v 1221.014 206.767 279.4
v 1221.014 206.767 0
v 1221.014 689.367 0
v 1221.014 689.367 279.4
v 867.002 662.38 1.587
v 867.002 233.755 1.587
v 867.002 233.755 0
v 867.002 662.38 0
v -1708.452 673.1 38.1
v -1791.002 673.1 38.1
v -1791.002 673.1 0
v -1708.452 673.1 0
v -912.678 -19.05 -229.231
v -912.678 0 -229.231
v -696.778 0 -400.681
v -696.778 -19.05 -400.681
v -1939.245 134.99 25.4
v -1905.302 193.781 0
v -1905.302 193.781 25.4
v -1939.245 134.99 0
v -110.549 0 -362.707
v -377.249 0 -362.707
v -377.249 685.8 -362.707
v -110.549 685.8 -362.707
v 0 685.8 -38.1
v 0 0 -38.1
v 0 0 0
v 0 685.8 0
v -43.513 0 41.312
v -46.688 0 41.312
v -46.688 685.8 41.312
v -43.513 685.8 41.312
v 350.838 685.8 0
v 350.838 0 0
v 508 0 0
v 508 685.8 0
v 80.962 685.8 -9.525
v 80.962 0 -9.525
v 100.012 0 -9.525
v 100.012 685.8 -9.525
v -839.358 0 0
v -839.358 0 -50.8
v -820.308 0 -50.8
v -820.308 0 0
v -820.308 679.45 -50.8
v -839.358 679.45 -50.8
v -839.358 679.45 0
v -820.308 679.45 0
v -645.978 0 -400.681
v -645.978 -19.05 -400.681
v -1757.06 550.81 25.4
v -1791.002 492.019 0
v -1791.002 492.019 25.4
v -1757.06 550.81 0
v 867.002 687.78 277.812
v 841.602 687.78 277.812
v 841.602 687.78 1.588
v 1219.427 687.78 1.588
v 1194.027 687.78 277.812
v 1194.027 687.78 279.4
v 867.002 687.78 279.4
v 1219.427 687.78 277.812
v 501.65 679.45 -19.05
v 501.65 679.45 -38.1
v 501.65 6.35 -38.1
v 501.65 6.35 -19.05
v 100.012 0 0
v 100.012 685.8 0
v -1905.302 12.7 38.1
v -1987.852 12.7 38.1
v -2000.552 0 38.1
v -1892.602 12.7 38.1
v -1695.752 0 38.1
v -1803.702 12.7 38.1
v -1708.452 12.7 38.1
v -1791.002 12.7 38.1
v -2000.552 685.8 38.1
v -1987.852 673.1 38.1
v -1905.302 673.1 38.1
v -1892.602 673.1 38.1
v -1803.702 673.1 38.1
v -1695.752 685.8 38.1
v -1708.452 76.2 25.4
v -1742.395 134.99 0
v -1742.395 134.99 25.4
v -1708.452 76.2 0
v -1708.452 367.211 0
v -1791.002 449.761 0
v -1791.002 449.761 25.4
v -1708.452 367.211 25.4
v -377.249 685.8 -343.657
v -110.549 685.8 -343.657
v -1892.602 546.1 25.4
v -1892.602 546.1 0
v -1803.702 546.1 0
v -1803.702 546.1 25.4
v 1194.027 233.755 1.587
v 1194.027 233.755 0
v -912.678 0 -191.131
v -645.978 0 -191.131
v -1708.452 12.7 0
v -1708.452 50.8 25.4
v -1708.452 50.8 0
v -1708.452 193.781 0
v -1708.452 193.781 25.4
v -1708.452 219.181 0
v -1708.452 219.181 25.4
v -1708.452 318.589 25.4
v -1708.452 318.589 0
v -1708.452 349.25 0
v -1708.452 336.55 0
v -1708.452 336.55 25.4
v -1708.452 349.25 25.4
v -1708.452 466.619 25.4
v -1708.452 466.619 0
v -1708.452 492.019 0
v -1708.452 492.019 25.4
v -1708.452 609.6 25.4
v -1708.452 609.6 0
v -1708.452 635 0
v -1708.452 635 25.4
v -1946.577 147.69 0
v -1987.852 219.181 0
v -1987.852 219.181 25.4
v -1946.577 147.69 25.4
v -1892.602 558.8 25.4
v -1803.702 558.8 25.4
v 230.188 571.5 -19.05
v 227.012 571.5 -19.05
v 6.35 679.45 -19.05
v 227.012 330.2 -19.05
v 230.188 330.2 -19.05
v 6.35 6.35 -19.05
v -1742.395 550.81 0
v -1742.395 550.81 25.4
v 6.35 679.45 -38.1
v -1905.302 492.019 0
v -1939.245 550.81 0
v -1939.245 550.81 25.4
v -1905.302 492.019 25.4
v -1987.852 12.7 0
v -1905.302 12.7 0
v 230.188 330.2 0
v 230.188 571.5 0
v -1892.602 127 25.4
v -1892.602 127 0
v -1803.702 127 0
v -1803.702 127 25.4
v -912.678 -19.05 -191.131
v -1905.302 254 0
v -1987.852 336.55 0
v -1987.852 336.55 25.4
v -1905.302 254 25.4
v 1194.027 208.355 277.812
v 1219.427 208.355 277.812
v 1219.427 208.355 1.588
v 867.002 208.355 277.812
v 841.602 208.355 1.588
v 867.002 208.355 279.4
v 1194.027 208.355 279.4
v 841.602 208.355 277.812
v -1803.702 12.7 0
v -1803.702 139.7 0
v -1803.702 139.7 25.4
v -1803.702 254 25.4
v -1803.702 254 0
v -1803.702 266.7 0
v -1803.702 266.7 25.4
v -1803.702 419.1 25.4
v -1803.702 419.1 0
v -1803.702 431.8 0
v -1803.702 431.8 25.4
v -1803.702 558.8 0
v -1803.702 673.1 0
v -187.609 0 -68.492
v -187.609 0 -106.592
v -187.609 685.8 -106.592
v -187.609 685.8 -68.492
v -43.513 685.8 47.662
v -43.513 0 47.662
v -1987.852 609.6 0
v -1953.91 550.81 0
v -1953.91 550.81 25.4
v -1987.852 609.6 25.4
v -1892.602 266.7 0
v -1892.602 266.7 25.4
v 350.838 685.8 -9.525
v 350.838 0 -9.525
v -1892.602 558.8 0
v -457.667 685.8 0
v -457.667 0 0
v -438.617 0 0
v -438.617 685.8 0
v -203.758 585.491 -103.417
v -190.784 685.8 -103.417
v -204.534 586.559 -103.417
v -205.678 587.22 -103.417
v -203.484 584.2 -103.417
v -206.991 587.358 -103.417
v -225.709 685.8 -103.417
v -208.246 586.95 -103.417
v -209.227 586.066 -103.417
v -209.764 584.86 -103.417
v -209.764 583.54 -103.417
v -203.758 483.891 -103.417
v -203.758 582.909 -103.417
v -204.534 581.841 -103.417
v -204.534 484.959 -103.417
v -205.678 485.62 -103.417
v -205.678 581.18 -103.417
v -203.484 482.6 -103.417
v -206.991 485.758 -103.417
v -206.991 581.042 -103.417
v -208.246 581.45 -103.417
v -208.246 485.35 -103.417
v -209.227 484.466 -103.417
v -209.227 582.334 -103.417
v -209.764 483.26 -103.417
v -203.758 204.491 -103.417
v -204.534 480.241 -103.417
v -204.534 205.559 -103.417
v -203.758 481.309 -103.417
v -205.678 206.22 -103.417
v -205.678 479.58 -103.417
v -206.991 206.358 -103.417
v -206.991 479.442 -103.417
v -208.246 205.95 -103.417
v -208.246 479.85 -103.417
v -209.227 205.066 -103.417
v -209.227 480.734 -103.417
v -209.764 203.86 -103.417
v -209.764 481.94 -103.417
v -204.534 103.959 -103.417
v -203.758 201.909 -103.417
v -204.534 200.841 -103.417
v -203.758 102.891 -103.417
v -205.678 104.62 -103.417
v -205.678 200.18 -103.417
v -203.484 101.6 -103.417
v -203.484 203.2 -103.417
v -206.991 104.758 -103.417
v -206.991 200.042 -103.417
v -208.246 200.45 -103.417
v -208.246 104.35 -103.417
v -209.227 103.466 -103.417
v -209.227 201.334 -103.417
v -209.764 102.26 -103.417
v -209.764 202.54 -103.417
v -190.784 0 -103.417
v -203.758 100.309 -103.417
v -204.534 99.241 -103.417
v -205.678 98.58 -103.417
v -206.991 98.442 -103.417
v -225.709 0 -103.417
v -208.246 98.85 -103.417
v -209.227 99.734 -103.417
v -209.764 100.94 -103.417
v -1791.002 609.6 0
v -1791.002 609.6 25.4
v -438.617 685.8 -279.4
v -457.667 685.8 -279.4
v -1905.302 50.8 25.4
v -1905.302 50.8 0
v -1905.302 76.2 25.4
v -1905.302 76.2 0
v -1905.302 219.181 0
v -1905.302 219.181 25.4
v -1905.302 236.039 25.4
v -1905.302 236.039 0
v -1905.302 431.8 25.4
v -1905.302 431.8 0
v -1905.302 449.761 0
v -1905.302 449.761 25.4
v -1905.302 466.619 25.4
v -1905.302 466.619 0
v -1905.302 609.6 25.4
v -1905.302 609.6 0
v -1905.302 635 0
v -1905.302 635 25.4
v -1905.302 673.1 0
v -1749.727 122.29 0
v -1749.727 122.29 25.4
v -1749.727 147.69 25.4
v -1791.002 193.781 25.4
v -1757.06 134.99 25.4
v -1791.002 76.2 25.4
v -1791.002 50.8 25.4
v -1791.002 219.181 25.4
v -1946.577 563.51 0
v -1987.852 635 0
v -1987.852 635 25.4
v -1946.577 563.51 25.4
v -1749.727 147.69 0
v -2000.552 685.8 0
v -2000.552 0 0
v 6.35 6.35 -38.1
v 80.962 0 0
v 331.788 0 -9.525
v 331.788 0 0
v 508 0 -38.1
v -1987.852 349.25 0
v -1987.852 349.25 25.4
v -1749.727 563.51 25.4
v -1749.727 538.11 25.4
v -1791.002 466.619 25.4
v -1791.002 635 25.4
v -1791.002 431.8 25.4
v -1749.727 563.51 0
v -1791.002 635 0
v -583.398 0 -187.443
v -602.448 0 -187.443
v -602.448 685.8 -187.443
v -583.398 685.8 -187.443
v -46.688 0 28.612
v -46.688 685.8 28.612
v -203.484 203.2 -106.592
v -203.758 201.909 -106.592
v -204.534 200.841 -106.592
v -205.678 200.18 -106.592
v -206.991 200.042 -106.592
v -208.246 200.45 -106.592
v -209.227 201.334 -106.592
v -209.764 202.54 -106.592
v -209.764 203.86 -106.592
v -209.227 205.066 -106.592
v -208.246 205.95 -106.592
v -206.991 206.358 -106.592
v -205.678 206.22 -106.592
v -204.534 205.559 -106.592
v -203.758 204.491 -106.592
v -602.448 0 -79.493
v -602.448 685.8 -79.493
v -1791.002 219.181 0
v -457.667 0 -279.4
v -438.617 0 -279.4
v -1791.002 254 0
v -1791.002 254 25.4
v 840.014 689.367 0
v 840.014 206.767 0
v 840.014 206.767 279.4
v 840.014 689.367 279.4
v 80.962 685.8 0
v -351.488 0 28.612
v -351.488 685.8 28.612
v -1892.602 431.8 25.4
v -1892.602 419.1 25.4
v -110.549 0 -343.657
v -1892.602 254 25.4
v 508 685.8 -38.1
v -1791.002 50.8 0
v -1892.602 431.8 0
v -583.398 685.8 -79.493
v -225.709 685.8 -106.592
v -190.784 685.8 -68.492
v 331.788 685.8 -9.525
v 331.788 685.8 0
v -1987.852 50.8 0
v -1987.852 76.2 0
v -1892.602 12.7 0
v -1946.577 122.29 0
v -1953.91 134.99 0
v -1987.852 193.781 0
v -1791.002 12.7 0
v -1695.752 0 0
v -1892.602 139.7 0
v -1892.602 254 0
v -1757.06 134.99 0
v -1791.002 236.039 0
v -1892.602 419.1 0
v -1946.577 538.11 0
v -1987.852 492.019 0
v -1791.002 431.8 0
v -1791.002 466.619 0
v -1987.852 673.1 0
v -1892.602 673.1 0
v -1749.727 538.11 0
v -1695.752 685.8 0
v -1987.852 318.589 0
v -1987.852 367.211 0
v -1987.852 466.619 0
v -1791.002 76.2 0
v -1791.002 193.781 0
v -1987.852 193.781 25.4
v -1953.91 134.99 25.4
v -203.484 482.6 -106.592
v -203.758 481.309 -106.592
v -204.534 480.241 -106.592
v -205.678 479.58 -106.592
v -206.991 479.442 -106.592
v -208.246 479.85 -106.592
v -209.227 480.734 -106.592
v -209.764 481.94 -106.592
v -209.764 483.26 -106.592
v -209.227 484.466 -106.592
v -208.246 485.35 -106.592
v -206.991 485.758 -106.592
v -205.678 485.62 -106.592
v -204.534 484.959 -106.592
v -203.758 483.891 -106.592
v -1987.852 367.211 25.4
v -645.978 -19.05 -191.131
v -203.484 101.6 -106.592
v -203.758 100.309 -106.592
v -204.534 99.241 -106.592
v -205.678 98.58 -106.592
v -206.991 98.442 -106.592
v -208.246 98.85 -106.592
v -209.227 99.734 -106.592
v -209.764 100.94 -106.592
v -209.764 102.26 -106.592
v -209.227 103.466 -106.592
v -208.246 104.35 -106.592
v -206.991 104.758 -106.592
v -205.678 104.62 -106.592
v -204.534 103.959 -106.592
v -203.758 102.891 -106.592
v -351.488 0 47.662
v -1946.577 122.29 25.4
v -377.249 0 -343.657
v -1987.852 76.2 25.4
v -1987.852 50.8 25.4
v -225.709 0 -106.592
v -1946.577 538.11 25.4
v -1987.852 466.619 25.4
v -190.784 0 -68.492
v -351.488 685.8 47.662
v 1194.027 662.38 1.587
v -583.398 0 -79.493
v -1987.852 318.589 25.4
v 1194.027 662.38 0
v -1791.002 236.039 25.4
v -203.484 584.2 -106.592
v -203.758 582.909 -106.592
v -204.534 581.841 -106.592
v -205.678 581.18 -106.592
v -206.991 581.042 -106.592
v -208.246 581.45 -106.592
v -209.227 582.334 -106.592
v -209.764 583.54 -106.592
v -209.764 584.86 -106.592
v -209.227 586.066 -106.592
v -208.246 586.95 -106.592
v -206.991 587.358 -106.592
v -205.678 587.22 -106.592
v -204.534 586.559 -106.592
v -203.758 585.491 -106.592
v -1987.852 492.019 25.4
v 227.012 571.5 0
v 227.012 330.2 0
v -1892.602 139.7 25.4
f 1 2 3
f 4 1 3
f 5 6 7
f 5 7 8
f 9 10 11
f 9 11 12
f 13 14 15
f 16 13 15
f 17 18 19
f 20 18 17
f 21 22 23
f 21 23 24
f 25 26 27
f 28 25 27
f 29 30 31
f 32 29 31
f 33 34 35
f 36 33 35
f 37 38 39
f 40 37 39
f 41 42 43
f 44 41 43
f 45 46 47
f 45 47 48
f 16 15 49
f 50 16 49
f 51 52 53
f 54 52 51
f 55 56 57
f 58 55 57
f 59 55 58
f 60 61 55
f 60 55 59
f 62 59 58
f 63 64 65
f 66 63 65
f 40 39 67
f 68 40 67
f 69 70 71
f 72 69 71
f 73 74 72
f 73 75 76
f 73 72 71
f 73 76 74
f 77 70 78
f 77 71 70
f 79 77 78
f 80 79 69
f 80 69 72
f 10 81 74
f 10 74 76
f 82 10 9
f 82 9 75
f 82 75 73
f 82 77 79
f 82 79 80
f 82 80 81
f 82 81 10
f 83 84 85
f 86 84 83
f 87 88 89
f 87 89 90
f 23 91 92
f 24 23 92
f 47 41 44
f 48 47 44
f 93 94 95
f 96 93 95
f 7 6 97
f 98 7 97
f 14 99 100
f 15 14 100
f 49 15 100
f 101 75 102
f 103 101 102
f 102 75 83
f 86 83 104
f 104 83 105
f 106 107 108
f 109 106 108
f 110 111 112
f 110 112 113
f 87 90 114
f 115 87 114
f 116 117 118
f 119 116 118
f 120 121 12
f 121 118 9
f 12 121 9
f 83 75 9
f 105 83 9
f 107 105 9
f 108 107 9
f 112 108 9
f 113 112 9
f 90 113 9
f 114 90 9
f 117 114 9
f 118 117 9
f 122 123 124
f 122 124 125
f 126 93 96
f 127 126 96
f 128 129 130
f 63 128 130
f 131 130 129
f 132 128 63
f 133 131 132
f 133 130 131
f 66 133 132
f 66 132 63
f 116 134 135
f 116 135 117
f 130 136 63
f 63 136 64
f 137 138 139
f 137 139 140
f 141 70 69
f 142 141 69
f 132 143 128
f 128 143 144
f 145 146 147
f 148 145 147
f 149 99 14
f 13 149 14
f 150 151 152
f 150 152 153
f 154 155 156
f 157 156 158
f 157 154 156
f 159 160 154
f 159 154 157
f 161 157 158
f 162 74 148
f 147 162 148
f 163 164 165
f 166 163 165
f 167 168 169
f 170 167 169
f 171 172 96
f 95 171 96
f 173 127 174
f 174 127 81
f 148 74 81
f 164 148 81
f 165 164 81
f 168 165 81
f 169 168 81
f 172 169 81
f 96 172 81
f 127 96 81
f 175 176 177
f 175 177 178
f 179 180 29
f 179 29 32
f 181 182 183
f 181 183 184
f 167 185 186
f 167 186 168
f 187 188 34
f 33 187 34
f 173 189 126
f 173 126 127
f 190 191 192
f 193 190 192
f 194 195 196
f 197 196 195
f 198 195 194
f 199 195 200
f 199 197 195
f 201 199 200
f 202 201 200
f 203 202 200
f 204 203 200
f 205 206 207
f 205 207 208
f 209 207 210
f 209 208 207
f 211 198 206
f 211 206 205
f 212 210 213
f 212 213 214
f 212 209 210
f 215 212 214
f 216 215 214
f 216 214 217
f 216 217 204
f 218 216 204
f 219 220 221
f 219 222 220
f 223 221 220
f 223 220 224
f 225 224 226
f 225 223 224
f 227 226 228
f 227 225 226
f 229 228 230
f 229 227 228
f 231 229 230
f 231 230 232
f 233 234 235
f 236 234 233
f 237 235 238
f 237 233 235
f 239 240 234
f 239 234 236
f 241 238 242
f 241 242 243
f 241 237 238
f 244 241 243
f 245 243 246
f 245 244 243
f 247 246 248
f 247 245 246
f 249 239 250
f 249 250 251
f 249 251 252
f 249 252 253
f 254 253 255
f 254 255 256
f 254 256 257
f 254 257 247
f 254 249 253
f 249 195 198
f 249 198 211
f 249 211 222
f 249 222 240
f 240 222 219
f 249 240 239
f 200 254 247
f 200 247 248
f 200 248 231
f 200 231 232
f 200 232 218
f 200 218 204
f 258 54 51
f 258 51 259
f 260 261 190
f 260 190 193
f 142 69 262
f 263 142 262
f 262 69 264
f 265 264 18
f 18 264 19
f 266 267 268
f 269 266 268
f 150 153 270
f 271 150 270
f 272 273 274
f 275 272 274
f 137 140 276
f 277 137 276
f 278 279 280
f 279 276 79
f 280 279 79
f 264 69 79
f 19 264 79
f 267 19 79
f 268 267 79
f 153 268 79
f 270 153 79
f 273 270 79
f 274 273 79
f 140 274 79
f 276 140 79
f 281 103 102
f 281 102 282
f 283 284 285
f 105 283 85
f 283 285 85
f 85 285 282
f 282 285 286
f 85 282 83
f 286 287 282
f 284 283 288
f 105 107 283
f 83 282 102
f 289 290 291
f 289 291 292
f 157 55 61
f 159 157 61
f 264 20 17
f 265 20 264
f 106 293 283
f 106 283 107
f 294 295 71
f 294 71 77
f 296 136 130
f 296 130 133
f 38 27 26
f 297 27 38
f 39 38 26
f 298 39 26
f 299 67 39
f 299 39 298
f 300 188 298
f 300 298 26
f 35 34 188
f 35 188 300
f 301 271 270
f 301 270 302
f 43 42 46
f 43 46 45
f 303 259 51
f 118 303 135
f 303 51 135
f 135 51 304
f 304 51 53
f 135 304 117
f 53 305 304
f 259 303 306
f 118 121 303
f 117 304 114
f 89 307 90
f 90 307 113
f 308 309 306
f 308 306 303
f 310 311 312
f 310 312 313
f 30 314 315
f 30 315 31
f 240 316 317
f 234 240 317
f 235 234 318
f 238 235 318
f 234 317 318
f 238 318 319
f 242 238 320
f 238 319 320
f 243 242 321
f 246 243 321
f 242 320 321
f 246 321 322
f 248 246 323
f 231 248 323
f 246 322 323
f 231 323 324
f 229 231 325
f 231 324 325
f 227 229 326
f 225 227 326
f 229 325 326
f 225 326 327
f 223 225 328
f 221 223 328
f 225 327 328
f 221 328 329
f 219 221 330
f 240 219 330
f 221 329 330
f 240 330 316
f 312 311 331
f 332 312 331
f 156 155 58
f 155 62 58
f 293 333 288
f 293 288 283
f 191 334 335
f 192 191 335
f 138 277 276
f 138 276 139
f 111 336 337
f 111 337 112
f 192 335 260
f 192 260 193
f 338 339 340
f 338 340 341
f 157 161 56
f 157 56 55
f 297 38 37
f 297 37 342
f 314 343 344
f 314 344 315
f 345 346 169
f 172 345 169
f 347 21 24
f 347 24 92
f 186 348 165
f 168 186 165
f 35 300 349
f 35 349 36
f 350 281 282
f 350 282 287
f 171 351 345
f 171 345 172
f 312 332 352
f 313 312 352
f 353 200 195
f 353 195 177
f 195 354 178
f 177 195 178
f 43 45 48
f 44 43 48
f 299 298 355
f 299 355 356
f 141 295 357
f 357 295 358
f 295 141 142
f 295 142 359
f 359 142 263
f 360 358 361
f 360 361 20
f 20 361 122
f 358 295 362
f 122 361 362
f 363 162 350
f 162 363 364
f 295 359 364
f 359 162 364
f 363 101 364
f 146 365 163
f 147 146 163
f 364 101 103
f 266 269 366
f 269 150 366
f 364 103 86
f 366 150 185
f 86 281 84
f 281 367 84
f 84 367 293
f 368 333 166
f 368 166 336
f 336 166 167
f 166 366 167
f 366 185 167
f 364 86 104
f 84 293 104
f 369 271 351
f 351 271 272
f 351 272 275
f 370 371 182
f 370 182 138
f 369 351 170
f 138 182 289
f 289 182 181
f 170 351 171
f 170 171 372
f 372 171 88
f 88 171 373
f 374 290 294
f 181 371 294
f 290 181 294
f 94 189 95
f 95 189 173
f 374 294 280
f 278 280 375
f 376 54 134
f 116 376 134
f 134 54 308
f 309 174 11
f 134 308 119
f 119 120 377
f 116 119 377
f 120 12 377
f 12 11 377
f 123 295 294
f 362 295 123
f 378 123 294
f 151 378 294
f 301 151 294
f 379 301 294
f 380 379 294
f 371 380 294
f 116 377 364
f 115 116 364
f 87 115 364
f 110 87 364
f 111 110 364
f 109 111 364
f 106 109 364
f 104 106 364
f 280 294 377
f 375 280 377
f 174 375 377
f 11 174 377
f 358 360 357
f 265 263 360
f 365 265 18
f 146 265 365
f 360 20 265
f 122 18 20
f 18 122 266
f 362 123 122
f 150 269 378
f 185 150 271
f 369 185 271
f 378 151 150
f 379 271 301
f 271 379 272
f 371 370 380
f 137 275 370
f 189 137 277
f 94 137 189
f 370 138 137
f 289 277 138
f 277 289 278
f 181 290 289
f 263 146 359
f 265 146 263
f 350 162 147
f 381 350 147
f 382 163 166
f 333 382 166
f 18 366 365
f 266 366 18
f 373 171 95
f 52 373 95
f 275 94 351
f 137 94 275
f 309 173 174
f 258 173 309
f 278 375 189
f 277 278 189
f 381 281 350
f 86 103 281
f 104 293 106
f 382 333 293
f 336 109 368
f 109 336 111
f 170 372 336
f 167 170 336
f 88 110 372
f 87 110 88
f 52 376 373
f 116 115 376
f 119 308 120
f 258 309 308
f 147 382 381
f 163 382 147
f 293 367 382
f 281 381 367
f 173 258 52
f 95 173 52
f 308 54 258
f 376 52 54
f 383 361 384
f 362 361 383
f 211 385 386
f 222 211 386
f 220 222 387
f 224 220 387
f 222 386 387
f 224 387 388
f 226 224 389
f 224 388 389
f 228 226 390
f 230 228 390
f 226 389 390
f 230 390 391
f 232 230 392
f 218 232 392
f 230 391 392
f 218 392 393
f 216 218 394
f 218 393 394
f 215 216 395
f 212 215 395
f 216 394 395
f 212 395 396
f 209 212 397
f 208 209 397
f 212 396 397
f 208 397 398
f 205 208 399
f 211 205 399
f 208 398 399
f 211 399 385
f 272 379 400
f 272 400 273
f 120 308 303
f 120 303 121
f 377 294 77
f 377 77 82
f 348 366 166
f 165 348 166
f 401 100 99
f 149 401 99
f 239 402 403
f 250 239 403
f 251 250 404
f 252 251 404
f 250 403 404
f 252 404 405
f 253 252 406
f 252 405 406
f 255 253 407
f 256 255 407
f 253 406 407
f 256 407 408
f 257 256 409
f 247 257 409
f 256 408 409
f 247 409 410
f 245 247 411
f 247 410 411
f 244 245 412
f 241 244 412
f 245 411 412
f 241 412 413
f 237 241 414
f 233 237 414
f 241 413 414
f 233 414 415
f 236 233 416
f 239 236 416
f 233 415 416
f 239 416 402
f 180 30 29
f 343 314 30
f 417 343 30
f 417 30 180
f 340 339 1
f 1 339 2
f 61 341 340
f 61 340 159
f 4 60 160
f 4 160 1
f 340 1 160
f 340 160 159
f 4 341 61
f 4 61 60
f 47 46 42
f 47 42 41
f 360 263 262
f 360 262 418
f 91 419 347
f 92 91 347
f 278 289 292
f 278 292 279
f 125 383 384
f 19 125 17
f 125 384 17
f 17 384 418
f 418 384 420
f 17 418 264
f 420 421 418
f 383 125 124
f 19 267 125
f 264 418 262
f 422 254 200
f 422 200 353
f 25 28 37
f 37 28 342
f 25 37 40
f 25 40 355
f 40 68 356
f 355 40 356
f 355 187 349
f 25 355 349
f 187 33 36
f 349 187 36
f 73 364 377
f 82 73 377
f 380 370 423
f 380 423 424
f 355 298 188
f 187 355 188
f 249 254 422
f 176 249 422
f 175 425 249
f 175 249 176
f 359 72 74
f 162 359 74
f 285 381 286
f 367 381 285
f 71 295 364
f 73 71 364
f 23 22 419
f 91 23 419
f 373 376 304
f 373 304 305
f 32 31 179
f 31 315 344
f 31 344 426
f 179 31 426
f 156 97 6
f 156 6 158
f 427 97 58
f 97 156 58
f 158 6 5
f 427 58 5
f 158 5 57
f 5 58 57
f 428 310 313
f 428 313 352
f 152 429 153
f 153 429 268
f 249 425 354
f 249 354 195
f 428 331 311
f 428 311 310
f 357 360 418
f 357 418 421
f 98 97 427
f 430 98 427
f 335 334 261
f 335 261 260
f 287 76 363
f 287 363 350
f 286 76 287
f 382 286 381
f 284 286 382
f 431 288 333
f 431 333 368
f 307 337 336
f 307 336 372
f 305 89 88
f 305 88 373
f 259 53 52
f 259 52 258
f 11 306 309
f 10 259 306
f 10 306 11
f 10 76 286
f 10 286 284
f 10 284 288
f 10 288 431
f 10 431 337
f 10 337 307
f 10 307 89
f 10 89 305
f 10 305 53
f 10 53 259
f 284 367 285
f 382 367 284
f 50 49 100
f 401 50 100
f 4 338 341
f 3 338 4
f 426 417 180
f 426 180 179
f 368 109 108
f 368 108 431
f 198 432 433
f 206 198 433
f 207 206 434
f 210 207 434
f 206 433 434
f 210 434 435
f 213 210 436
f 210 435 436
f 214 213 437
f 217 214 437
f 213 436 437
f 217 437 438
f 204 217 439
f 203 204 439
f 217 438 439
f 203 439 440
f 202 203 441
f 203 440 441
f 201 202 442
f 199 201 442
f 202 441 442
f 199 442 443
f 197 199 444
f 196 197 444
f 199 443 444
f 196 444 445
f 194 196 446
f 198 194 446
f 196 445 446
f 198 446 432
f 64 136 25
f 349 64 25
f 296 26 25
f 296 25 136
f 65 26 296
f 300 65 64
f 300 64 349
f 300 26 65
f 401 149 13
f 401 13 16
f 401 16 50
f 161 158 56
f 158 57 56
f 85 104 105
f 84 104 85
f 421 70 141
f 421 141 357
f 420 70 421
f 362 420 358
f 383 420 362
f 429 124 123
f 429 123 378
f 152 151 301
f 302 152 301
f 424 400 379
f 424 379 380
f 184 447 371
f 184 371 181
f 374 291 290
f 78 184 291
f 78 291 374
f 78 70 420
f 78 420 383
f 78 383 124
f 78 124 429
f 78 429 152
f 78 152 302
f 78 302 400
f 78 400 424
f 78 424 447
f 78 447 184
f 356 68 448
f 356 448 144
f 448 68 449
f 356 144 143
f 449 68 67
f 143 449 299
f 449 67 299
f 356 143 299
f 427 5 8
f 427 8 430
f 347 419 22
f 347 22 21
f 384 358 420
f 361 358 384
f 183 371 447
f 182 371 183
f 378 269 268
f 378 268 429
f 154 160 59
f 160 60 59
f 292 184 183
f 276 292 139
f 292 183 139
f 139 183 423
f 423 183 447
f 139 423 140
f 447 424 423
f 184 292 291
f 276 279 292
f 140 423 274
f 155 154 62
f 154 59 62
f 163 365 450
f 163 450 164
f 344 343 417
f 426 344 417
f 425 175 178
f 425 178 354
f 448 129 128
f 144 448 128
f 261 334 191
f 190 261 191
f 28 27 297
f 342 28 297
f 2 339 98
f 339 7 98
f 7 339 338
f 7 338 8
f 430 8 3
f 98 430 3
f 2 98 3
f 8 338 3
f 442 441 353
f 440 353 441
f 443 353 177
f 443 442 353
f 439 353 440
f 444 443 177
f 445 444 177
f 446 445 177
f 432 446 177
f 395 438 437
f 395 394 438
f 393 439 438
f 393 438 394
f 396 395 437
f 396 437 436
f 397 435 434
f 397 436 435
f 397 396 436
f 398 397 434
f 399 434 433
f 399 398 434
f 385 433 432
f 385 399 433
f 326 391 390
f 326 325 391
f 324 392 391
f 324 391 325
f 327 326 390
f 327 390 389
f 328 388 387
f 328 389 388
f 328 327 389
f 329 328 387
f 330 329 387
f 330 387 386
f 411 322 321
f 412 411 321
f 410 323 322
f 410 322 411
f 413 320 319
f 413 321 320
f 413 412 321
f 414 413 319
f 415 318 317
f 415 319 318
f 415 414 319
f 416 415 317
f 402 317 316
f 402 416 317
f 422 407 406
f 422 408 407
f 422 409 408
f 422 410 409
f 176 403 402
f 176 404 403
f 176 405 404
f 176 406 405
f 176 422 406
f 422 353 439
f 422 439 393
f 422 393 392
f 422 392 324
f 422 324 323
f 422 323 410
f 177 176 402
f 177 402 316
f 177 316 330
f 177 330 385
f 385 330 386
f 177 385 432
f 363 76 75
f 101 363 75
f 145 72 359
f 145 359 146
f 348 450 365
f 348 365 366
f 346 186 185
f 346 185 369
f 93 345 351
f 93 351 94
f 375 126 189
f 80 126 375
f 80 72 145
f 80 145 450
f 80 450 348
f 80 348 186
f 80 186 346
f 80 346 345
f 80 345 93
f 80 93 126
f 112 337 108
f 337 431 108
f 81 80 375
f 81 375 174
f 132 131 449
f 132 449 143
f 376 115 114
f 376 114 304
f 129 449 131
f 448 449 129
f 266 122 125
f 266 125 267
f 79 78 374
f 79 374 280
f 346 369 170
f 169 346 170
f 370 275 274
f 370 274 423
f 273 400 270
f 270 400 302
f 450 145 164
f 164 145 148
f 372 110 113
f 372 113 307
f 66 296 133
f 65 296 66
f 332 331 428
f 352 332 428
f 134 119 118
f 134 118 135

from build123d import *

# Parameters (mm, degrees)
F0_W      = 508
F0_H      = 38.1
F1_DEPTH  = 685.8
F3_DEPTH  = 685.8
F4_W      = 304.8
F4_H      = 19.05
F5_DEPTH  = 685.8
F6_W      = 19.05
F6_H      = 279.4
F7_DEPTH  = 685.8
F8_W      = 495.3
F8_H      = 673.1
F9_DEPTH  = 19.05
F10_W     = 685.8
F10_H     = 6.35
F11_DEPTH = 3.175
F12_R     = 3.175
F13_DEPTH = 154.2556030521
F14_W     = 266.7
F14_H     = 19.05
F15_DEPTH = 685.8
F16_W     = 19.05
F16_H     = 50.8
F17_DEPTH = 679.45
F18_W     = 19.05
F18_H     = 107.95
F19_DEPTH = 685.8
F21_DEPTH = 19.05
F22_W     = 19.05
F22_H     = 9.525
F23_DEPTH = 685.801
F24_W     = 3.175
F24_H     = 241.3
F25_DEPTH = 400.6821936617
F26_W     = 381
F26_H     = 482.6
F27_DEPTH = 279.4
F28_W     = 327.025
F28_H     = 428.625
F29_DEPTH = 680.0821936617
F30_W     = 428.625
F30_H     = 276.225
F31_DEPTH = 25.4
F32_W     = 428.625
F32_H     = 276.225
F33_DEPTH = 25.4
F35_DEPTH = 25.4
F37_DEPTH = 25.4
F38_W     = 304.8
F38_H     = 685.8
F39_DEPTH = 38.1
F40_W     = 82.55
F40_H     = 660.4
F40_W_2   = 88.9
F41_DEPTH = 438.7821936617
F42_W     = 88.9
F42_H     = 660.4
F42_W_2   = 82.55
F43_DEPTH = 6.35
F44_W     = 88.9
F44_H     = 12.7
F45_DEPTH = 25.4


with BuildPart() as f1:
    # F0 (on Front) → F1 (new body)
    with BuildSketch(Plane.XZ):
        with Locations((254, -19.05)):
            Rectangle(F0_W, F0_H)
    extrude(amount=-F1_DEPTH)

    # F8 (on face) → F9 (cut)
    with BuildSketch(Plane(origin=(0, 0, -38.1), x_dir=(1, 0, 0), z_dir=(0, 0, -1))):
        with Locations((254, -342.9)):
            Rectangle(F8_W, F8_H)
    extrude(amount=-F9_DEPTH, mode=Mode.SUBTRACT)

    # F22 (on face) → F23 (cut, through all)
    with BuildSketch(Plane.XZ):
        with Locations((90.4875, -4.7625)):
            Rectangle(F22_W, F22_H)
        with Locations((341.3125, -4.7625)):
            Rectangle(F22_W, F22_H)
    extrude(amount=-F23_DEPTH, mode=Mode.SUBTRACT)

    # F24 (on face) → F25 (cut, through all)
    with BuildSketch(Plane.XY):
        with Locations((228.6, 450.85)):
            Rectangle(F24_W, F24_H)
    extrude(amount=-F25_DEPTH, mode=Mode.SUBTRACT)

    # F42 (on face) → F43 (cut)
    with BuildSketch(Plane.XY.offset(38.1)):
        with Locations((-1848.1522202492, 342.9)):
            Rectangle(F42_W, F42_H)
        with Locations((-1749.7272202492, 342.9)):
            Rectangle(F42_W_2, F42_H)
    extrude(amount=-F43_DEPTH, mode=Mode.SUBTRACT)


with BuildPart() as f3:
    # F2 (on Front) → F3 (new body, through all)
    with BuildSketch(Plane.XZ):
        Polygon((-187.6088068062, -106.5923403651), (-187.6088068062, -68.4923403651), (-190.7838068062, -68.4923403651), (-190.7838068062, -103.4173403651), (-225.7088068062, -103.4173403651), (-225.7088068062, -106.5923403651), align=None)
    extrude(amount=-F3_DEPTH)

    # F12 (on face) → F13 (cut, through all)
    with BuildSketch(Plane(origin=(0, 0, -106.5923403651), x_dir=(1, 0, 0), z_dir=(0, 0, -1))):
        with Locations((-206.6588068062, -101.6)):
            Circle(F12_R)
        with Locations((-206.6588068062, -203.2)):
            Circle(F12_R)
        with Locations((-206.6588068062, -482.6)):
            Circle(F12_R)
        with Locations((-206.6588068062, -584.2)):
            Circle(F12_R)
    extrude(amount=-F13_DEPTH, mode=Mode.SUBTRACT)


with BuildPart() as f5:
    # F4 (on Front) → F5 (new body, through all)
    with BuildSketch(Plane.XZ):
        with Locations((-199.0881011365, 38.1372626871)):
            Rectangle(F4_W, F4_H)
    extrude(amount=-F5_DEPTH)

    # F10 (on face) → F11 (join)
    with BuildSketch(Plane.YZ.offset(-46.6881011365)):
        with Locations((342.9, 44.4872626871)):
            Rectangle(F10_W, F10_H)
    extrude(amount=F11_DEPTH)


with BuildPart() as f7:
    # F6 (on Front) → F7 (new body, through all)
    with BuildSketch(Plane.XZ):
        with Locations((-448.1418677211, -139.7)):
            Rectangle(F6_W, F6_H)
    extrude(amount=-F7_DEPTH)


with BuildPart() as f15:
    # F14 (on Front) → F15 (new body, through all)
    with BuildSketch(Plane.XZ):
        with Locations((-243.8991005421, -353.181636688)):
            Rectangle(F14_W, F14_H)
    extrude(amount=-F15_DEPTH)


with BuildPart() as f17:
    # F16 (on Front) → F17 (new body, through all)
    with BuildSketch(Plane.XZ):
        with Locations((-829.8331966219, -25.4)):
            Rectangle(F16_W, F16_H)
    extrude(amount=-F17_DEPTH)


with BuildPart() as f19:
    # F18 (on Front) → F19 (new body, through all)
    with BuildSketch(Plane.XZ):
        with Locations((-592.9225683212, -133.4683134563)):
            Rectangle(F18_W, F18_H)
    extrude(amount=-F19_DEPTH)


with BuildPart() as f21:
    # F20 (on Front) → F21 (new body)
    with BuildSketch(Plane.XZ):
        Polygon((-645.9781700617, -191.1311936617), (-912.6781700617, -191.1311936617), (-912.6781700617, -229.2311936617), (-696.7781700617, -400.6811936617), (-645.9781700617, -400.6811936617), align=None)
    extrude(amount=F21_DEPTH)


with BuildPart() as f27:
    # F26 (on Top) → F27 (new body)
    with BuildSketch(Plane.XY):
        with Locations((1030.5143296719, 448.0673644527)):
            Rectangle(F26_W, F26_H)
    extrude(amount=F27_DEPTH)

    # F28 (on face) → F29 (cut, through all)
    with BuildSketch(Plane.XY.offset(279.4)):
        with Locations((1030.5143296719, 448.0673644527)):
            Rectangle(F28_W, F28_H)
    extrude(amount=-F29_DEPTH, mode=Mode.SUBTRACT)

    # F30 (on face) → F31 (cut)
    with BuildSketch(Plane.YZ.offset(867.0018296719)):
        with Locations((448.0673644527, 139.7)):
            Rectangle(F30_W, F30_H)
    extrude(amount=-F31_DEPTH, mode=Mode.SUBTRACT)

    # F32 (on face) → F33 (cut)
    with BuildSketch(Plane(origin=(1194.0268296719, 0, 0), x_dir=(0, -1, 0), z_dir=(-1, 0, 0))):
        with Locations((-448.0673644527, 139.7)):
            Rectangle(F32_W, F32_H)
    extrude(amount=-F33_DEPTH, mode=Mode.SUBTRACT)

    # F34 (on face) → F35 (cut)
    with BuildSketch(Plane.XZ.offset(-662.3798644527)):
        Polygon((1194.0268296719, 279.4), (867.0018296719, 279.4), (867.0018296719, 277.8125), (841.6018296719, 277.8125), (841.6018296719, 1.5875), (1219.4268296719, 1.5875), (1219.4268296719, 277.8125), (1194.0268296719, 277.8125), align=None)
    extrude(amount=-F35_DEPTH, mode=Mode.SUBTRACT)

    # F36 (on face) → F37 (cut)
    with BuildSketch(Plane(origin=(0, 233.7548644527, 0), x_dir=(-1, 0, 0), z_dir=(0, 1, 0))):
        Polygon((-867.0018296719, 277.8125), (-867.0018296719, 279.4), (-1194.0268296719, 279.4), (-1194.0268296719, 277.8125), (-1219.4268296719, 277.8125), (-1219.4268296719, 1.5875), (-841.6018296719, 1.5875), (-841.6018296719, 277.8125), align=None)
    extrude(amount=-F37_DEPTH, mode=Mode.SUBTRACT)


with BuildPart() as f39:
    # F38 (on Top) → F39 (new body)
    with BuildSketch(Plane.XY):
        with Locations((-1848.1522202492, 342.9)):
            Rectangle(F38_W, F38_H)
    extrude(amount=F39_DEPTH)

    # F40 (on face) → F41 (cut, through all)
    with BuildSketch(Plane.XY.offset(38.1)):
        with Locations((-1946.5772202492, 342.9)):
            Rectangle(F40_W, F40_H)
        with Locations((-1848.1522202492, 342.9)):
            Rectangle(F40_W_2, F40_H)
        with Locations((-1749.7272202492, 342.9)):
            Rectangle(F40_W, F40_H)
    extrude(amount=-F41_DEPTH, mode=Mode.SUBTRACT)

    # F44 (on face) → F45 (join)
    with BuildSketch(Plane(origin=(0, 0, 0), x_dir=(1, 0, 0), z_dir=(0, 0, -1))):
        Polygon((-1749.7272202492, -122.2903970824), (-1791.0022202492, -50.8), (-1791.0022202492, -76.2), (-1757.0595686679, -134.9903970824), (-1791.0022202492, -193.7807941648), (-1791.0022202492, -219.1807941648), (-1749.7272202492, -147.6903970824), (-1708.4522202492, -219.1807941648), (-1708.4522202492, -193.7807941648), (-1742.3948718305, -134.9903970824), (-1708.4522202492, -76.2), (-1708.4522202492, -50.8), align=None)
        Polygon((-1749.7272202492, -538.1096029176), (-1791.0022202492, -466.6192058352), (-1791.0022202492, -492.0192058352), (-1757.0595686679, -550.8096029176), (-1791.0022202492, -609.6), (-1791.0022202492, -635), (-1749.7272202492, -563.5096029176), (-1708.4522202492, -635), (-1708.4522202492, -609.6), (-1742.3948718305, -550.8096029176), (-1708.4522202492, -492.0192058352), (-1708.4522202492, -466.6192058352), align=None)
        Polygon((-1708.4522202492, -367.2105122421), (-1708.4522202492, -349.25), (-1791.0022202492, -431.8), (-1791.0022202492, -449.7605122421), align=None)
        Polygon((-1791.0022202492, -254), (-1708.4522202492, -336.55), (-1708.4522202492, -318.5894877579), (-1791.0022202492, -236.0394877579), align=None)
        Polygon((-1946.5772202492, -122.2903970824), (-1987.8522202492, -50.8), (-1987.8522202492, -76.2), (-1953.9095686679, -134.9903970824), (-1987.8522202492, -193.7807941648), (-1987.8522202492, -219.1807941648), (-1946.5772202492, -147.6903970824), (-1905.3022202492, -219.1807941648), (-1905.3022202492, -193.7807941648), (-1939.2448718305, -134.9903970824), (-1905.3022202492, -76.2), (-1905.3022202492, -50.8), align=None)
        Polygon((-1946.5772202492, -538.1096029176), (-1987.8522202492, -466.6192058352), (-1987.8522202492, -492.0192058352), (-1953.9095686679, -550.8096029176), (-1987.8522202492, -609.6), (-1987.8522202492, -635), (-1946.5772202492, -563.5096029176), (-1905.3022202492, -635), (-1905.3022202492, -609.6), (-1939.2448718305, -550.8096029176), (-1905.3022202492, -492.0192058352), (-1905.3022202492, -466.6192058352), align=None)
        Polygon((-1905.3022202492, -449.7605122421), (-1905.3022202492, -431.8), (-1987.8522202492, -349.25), (-1987.8522202492, -367.2105122421), align=None)
        Polygon((-1987.8522202492, -336.55), (-1905.3022202492, -254), (-1905.3022202492, -236.0394877579), (-1987.8522202492, -318.5894877579), align=None)
        with Locations((-1848.1522202492, -133.35)):
            Rectangle(F44_W, F44_H)
        with Locations((-1848.1522202492, -260.35)):
            Rectangle(F44_W, F44_H)
        with Locations((-1848.1522202492, -425.45)):
            Rectangle(F44_W, F44_H)
        with Locations((-1848.1522202492, -552.45)):
            Rectangle(F44_W, F44_H)
    extrude(amount=-F45_DEPTH)


solid = Compound([f1.part, f3.part, f5.part, f7.part, f15.part, f17.part, f19.part, f21.part, f27.part, f39.part])
